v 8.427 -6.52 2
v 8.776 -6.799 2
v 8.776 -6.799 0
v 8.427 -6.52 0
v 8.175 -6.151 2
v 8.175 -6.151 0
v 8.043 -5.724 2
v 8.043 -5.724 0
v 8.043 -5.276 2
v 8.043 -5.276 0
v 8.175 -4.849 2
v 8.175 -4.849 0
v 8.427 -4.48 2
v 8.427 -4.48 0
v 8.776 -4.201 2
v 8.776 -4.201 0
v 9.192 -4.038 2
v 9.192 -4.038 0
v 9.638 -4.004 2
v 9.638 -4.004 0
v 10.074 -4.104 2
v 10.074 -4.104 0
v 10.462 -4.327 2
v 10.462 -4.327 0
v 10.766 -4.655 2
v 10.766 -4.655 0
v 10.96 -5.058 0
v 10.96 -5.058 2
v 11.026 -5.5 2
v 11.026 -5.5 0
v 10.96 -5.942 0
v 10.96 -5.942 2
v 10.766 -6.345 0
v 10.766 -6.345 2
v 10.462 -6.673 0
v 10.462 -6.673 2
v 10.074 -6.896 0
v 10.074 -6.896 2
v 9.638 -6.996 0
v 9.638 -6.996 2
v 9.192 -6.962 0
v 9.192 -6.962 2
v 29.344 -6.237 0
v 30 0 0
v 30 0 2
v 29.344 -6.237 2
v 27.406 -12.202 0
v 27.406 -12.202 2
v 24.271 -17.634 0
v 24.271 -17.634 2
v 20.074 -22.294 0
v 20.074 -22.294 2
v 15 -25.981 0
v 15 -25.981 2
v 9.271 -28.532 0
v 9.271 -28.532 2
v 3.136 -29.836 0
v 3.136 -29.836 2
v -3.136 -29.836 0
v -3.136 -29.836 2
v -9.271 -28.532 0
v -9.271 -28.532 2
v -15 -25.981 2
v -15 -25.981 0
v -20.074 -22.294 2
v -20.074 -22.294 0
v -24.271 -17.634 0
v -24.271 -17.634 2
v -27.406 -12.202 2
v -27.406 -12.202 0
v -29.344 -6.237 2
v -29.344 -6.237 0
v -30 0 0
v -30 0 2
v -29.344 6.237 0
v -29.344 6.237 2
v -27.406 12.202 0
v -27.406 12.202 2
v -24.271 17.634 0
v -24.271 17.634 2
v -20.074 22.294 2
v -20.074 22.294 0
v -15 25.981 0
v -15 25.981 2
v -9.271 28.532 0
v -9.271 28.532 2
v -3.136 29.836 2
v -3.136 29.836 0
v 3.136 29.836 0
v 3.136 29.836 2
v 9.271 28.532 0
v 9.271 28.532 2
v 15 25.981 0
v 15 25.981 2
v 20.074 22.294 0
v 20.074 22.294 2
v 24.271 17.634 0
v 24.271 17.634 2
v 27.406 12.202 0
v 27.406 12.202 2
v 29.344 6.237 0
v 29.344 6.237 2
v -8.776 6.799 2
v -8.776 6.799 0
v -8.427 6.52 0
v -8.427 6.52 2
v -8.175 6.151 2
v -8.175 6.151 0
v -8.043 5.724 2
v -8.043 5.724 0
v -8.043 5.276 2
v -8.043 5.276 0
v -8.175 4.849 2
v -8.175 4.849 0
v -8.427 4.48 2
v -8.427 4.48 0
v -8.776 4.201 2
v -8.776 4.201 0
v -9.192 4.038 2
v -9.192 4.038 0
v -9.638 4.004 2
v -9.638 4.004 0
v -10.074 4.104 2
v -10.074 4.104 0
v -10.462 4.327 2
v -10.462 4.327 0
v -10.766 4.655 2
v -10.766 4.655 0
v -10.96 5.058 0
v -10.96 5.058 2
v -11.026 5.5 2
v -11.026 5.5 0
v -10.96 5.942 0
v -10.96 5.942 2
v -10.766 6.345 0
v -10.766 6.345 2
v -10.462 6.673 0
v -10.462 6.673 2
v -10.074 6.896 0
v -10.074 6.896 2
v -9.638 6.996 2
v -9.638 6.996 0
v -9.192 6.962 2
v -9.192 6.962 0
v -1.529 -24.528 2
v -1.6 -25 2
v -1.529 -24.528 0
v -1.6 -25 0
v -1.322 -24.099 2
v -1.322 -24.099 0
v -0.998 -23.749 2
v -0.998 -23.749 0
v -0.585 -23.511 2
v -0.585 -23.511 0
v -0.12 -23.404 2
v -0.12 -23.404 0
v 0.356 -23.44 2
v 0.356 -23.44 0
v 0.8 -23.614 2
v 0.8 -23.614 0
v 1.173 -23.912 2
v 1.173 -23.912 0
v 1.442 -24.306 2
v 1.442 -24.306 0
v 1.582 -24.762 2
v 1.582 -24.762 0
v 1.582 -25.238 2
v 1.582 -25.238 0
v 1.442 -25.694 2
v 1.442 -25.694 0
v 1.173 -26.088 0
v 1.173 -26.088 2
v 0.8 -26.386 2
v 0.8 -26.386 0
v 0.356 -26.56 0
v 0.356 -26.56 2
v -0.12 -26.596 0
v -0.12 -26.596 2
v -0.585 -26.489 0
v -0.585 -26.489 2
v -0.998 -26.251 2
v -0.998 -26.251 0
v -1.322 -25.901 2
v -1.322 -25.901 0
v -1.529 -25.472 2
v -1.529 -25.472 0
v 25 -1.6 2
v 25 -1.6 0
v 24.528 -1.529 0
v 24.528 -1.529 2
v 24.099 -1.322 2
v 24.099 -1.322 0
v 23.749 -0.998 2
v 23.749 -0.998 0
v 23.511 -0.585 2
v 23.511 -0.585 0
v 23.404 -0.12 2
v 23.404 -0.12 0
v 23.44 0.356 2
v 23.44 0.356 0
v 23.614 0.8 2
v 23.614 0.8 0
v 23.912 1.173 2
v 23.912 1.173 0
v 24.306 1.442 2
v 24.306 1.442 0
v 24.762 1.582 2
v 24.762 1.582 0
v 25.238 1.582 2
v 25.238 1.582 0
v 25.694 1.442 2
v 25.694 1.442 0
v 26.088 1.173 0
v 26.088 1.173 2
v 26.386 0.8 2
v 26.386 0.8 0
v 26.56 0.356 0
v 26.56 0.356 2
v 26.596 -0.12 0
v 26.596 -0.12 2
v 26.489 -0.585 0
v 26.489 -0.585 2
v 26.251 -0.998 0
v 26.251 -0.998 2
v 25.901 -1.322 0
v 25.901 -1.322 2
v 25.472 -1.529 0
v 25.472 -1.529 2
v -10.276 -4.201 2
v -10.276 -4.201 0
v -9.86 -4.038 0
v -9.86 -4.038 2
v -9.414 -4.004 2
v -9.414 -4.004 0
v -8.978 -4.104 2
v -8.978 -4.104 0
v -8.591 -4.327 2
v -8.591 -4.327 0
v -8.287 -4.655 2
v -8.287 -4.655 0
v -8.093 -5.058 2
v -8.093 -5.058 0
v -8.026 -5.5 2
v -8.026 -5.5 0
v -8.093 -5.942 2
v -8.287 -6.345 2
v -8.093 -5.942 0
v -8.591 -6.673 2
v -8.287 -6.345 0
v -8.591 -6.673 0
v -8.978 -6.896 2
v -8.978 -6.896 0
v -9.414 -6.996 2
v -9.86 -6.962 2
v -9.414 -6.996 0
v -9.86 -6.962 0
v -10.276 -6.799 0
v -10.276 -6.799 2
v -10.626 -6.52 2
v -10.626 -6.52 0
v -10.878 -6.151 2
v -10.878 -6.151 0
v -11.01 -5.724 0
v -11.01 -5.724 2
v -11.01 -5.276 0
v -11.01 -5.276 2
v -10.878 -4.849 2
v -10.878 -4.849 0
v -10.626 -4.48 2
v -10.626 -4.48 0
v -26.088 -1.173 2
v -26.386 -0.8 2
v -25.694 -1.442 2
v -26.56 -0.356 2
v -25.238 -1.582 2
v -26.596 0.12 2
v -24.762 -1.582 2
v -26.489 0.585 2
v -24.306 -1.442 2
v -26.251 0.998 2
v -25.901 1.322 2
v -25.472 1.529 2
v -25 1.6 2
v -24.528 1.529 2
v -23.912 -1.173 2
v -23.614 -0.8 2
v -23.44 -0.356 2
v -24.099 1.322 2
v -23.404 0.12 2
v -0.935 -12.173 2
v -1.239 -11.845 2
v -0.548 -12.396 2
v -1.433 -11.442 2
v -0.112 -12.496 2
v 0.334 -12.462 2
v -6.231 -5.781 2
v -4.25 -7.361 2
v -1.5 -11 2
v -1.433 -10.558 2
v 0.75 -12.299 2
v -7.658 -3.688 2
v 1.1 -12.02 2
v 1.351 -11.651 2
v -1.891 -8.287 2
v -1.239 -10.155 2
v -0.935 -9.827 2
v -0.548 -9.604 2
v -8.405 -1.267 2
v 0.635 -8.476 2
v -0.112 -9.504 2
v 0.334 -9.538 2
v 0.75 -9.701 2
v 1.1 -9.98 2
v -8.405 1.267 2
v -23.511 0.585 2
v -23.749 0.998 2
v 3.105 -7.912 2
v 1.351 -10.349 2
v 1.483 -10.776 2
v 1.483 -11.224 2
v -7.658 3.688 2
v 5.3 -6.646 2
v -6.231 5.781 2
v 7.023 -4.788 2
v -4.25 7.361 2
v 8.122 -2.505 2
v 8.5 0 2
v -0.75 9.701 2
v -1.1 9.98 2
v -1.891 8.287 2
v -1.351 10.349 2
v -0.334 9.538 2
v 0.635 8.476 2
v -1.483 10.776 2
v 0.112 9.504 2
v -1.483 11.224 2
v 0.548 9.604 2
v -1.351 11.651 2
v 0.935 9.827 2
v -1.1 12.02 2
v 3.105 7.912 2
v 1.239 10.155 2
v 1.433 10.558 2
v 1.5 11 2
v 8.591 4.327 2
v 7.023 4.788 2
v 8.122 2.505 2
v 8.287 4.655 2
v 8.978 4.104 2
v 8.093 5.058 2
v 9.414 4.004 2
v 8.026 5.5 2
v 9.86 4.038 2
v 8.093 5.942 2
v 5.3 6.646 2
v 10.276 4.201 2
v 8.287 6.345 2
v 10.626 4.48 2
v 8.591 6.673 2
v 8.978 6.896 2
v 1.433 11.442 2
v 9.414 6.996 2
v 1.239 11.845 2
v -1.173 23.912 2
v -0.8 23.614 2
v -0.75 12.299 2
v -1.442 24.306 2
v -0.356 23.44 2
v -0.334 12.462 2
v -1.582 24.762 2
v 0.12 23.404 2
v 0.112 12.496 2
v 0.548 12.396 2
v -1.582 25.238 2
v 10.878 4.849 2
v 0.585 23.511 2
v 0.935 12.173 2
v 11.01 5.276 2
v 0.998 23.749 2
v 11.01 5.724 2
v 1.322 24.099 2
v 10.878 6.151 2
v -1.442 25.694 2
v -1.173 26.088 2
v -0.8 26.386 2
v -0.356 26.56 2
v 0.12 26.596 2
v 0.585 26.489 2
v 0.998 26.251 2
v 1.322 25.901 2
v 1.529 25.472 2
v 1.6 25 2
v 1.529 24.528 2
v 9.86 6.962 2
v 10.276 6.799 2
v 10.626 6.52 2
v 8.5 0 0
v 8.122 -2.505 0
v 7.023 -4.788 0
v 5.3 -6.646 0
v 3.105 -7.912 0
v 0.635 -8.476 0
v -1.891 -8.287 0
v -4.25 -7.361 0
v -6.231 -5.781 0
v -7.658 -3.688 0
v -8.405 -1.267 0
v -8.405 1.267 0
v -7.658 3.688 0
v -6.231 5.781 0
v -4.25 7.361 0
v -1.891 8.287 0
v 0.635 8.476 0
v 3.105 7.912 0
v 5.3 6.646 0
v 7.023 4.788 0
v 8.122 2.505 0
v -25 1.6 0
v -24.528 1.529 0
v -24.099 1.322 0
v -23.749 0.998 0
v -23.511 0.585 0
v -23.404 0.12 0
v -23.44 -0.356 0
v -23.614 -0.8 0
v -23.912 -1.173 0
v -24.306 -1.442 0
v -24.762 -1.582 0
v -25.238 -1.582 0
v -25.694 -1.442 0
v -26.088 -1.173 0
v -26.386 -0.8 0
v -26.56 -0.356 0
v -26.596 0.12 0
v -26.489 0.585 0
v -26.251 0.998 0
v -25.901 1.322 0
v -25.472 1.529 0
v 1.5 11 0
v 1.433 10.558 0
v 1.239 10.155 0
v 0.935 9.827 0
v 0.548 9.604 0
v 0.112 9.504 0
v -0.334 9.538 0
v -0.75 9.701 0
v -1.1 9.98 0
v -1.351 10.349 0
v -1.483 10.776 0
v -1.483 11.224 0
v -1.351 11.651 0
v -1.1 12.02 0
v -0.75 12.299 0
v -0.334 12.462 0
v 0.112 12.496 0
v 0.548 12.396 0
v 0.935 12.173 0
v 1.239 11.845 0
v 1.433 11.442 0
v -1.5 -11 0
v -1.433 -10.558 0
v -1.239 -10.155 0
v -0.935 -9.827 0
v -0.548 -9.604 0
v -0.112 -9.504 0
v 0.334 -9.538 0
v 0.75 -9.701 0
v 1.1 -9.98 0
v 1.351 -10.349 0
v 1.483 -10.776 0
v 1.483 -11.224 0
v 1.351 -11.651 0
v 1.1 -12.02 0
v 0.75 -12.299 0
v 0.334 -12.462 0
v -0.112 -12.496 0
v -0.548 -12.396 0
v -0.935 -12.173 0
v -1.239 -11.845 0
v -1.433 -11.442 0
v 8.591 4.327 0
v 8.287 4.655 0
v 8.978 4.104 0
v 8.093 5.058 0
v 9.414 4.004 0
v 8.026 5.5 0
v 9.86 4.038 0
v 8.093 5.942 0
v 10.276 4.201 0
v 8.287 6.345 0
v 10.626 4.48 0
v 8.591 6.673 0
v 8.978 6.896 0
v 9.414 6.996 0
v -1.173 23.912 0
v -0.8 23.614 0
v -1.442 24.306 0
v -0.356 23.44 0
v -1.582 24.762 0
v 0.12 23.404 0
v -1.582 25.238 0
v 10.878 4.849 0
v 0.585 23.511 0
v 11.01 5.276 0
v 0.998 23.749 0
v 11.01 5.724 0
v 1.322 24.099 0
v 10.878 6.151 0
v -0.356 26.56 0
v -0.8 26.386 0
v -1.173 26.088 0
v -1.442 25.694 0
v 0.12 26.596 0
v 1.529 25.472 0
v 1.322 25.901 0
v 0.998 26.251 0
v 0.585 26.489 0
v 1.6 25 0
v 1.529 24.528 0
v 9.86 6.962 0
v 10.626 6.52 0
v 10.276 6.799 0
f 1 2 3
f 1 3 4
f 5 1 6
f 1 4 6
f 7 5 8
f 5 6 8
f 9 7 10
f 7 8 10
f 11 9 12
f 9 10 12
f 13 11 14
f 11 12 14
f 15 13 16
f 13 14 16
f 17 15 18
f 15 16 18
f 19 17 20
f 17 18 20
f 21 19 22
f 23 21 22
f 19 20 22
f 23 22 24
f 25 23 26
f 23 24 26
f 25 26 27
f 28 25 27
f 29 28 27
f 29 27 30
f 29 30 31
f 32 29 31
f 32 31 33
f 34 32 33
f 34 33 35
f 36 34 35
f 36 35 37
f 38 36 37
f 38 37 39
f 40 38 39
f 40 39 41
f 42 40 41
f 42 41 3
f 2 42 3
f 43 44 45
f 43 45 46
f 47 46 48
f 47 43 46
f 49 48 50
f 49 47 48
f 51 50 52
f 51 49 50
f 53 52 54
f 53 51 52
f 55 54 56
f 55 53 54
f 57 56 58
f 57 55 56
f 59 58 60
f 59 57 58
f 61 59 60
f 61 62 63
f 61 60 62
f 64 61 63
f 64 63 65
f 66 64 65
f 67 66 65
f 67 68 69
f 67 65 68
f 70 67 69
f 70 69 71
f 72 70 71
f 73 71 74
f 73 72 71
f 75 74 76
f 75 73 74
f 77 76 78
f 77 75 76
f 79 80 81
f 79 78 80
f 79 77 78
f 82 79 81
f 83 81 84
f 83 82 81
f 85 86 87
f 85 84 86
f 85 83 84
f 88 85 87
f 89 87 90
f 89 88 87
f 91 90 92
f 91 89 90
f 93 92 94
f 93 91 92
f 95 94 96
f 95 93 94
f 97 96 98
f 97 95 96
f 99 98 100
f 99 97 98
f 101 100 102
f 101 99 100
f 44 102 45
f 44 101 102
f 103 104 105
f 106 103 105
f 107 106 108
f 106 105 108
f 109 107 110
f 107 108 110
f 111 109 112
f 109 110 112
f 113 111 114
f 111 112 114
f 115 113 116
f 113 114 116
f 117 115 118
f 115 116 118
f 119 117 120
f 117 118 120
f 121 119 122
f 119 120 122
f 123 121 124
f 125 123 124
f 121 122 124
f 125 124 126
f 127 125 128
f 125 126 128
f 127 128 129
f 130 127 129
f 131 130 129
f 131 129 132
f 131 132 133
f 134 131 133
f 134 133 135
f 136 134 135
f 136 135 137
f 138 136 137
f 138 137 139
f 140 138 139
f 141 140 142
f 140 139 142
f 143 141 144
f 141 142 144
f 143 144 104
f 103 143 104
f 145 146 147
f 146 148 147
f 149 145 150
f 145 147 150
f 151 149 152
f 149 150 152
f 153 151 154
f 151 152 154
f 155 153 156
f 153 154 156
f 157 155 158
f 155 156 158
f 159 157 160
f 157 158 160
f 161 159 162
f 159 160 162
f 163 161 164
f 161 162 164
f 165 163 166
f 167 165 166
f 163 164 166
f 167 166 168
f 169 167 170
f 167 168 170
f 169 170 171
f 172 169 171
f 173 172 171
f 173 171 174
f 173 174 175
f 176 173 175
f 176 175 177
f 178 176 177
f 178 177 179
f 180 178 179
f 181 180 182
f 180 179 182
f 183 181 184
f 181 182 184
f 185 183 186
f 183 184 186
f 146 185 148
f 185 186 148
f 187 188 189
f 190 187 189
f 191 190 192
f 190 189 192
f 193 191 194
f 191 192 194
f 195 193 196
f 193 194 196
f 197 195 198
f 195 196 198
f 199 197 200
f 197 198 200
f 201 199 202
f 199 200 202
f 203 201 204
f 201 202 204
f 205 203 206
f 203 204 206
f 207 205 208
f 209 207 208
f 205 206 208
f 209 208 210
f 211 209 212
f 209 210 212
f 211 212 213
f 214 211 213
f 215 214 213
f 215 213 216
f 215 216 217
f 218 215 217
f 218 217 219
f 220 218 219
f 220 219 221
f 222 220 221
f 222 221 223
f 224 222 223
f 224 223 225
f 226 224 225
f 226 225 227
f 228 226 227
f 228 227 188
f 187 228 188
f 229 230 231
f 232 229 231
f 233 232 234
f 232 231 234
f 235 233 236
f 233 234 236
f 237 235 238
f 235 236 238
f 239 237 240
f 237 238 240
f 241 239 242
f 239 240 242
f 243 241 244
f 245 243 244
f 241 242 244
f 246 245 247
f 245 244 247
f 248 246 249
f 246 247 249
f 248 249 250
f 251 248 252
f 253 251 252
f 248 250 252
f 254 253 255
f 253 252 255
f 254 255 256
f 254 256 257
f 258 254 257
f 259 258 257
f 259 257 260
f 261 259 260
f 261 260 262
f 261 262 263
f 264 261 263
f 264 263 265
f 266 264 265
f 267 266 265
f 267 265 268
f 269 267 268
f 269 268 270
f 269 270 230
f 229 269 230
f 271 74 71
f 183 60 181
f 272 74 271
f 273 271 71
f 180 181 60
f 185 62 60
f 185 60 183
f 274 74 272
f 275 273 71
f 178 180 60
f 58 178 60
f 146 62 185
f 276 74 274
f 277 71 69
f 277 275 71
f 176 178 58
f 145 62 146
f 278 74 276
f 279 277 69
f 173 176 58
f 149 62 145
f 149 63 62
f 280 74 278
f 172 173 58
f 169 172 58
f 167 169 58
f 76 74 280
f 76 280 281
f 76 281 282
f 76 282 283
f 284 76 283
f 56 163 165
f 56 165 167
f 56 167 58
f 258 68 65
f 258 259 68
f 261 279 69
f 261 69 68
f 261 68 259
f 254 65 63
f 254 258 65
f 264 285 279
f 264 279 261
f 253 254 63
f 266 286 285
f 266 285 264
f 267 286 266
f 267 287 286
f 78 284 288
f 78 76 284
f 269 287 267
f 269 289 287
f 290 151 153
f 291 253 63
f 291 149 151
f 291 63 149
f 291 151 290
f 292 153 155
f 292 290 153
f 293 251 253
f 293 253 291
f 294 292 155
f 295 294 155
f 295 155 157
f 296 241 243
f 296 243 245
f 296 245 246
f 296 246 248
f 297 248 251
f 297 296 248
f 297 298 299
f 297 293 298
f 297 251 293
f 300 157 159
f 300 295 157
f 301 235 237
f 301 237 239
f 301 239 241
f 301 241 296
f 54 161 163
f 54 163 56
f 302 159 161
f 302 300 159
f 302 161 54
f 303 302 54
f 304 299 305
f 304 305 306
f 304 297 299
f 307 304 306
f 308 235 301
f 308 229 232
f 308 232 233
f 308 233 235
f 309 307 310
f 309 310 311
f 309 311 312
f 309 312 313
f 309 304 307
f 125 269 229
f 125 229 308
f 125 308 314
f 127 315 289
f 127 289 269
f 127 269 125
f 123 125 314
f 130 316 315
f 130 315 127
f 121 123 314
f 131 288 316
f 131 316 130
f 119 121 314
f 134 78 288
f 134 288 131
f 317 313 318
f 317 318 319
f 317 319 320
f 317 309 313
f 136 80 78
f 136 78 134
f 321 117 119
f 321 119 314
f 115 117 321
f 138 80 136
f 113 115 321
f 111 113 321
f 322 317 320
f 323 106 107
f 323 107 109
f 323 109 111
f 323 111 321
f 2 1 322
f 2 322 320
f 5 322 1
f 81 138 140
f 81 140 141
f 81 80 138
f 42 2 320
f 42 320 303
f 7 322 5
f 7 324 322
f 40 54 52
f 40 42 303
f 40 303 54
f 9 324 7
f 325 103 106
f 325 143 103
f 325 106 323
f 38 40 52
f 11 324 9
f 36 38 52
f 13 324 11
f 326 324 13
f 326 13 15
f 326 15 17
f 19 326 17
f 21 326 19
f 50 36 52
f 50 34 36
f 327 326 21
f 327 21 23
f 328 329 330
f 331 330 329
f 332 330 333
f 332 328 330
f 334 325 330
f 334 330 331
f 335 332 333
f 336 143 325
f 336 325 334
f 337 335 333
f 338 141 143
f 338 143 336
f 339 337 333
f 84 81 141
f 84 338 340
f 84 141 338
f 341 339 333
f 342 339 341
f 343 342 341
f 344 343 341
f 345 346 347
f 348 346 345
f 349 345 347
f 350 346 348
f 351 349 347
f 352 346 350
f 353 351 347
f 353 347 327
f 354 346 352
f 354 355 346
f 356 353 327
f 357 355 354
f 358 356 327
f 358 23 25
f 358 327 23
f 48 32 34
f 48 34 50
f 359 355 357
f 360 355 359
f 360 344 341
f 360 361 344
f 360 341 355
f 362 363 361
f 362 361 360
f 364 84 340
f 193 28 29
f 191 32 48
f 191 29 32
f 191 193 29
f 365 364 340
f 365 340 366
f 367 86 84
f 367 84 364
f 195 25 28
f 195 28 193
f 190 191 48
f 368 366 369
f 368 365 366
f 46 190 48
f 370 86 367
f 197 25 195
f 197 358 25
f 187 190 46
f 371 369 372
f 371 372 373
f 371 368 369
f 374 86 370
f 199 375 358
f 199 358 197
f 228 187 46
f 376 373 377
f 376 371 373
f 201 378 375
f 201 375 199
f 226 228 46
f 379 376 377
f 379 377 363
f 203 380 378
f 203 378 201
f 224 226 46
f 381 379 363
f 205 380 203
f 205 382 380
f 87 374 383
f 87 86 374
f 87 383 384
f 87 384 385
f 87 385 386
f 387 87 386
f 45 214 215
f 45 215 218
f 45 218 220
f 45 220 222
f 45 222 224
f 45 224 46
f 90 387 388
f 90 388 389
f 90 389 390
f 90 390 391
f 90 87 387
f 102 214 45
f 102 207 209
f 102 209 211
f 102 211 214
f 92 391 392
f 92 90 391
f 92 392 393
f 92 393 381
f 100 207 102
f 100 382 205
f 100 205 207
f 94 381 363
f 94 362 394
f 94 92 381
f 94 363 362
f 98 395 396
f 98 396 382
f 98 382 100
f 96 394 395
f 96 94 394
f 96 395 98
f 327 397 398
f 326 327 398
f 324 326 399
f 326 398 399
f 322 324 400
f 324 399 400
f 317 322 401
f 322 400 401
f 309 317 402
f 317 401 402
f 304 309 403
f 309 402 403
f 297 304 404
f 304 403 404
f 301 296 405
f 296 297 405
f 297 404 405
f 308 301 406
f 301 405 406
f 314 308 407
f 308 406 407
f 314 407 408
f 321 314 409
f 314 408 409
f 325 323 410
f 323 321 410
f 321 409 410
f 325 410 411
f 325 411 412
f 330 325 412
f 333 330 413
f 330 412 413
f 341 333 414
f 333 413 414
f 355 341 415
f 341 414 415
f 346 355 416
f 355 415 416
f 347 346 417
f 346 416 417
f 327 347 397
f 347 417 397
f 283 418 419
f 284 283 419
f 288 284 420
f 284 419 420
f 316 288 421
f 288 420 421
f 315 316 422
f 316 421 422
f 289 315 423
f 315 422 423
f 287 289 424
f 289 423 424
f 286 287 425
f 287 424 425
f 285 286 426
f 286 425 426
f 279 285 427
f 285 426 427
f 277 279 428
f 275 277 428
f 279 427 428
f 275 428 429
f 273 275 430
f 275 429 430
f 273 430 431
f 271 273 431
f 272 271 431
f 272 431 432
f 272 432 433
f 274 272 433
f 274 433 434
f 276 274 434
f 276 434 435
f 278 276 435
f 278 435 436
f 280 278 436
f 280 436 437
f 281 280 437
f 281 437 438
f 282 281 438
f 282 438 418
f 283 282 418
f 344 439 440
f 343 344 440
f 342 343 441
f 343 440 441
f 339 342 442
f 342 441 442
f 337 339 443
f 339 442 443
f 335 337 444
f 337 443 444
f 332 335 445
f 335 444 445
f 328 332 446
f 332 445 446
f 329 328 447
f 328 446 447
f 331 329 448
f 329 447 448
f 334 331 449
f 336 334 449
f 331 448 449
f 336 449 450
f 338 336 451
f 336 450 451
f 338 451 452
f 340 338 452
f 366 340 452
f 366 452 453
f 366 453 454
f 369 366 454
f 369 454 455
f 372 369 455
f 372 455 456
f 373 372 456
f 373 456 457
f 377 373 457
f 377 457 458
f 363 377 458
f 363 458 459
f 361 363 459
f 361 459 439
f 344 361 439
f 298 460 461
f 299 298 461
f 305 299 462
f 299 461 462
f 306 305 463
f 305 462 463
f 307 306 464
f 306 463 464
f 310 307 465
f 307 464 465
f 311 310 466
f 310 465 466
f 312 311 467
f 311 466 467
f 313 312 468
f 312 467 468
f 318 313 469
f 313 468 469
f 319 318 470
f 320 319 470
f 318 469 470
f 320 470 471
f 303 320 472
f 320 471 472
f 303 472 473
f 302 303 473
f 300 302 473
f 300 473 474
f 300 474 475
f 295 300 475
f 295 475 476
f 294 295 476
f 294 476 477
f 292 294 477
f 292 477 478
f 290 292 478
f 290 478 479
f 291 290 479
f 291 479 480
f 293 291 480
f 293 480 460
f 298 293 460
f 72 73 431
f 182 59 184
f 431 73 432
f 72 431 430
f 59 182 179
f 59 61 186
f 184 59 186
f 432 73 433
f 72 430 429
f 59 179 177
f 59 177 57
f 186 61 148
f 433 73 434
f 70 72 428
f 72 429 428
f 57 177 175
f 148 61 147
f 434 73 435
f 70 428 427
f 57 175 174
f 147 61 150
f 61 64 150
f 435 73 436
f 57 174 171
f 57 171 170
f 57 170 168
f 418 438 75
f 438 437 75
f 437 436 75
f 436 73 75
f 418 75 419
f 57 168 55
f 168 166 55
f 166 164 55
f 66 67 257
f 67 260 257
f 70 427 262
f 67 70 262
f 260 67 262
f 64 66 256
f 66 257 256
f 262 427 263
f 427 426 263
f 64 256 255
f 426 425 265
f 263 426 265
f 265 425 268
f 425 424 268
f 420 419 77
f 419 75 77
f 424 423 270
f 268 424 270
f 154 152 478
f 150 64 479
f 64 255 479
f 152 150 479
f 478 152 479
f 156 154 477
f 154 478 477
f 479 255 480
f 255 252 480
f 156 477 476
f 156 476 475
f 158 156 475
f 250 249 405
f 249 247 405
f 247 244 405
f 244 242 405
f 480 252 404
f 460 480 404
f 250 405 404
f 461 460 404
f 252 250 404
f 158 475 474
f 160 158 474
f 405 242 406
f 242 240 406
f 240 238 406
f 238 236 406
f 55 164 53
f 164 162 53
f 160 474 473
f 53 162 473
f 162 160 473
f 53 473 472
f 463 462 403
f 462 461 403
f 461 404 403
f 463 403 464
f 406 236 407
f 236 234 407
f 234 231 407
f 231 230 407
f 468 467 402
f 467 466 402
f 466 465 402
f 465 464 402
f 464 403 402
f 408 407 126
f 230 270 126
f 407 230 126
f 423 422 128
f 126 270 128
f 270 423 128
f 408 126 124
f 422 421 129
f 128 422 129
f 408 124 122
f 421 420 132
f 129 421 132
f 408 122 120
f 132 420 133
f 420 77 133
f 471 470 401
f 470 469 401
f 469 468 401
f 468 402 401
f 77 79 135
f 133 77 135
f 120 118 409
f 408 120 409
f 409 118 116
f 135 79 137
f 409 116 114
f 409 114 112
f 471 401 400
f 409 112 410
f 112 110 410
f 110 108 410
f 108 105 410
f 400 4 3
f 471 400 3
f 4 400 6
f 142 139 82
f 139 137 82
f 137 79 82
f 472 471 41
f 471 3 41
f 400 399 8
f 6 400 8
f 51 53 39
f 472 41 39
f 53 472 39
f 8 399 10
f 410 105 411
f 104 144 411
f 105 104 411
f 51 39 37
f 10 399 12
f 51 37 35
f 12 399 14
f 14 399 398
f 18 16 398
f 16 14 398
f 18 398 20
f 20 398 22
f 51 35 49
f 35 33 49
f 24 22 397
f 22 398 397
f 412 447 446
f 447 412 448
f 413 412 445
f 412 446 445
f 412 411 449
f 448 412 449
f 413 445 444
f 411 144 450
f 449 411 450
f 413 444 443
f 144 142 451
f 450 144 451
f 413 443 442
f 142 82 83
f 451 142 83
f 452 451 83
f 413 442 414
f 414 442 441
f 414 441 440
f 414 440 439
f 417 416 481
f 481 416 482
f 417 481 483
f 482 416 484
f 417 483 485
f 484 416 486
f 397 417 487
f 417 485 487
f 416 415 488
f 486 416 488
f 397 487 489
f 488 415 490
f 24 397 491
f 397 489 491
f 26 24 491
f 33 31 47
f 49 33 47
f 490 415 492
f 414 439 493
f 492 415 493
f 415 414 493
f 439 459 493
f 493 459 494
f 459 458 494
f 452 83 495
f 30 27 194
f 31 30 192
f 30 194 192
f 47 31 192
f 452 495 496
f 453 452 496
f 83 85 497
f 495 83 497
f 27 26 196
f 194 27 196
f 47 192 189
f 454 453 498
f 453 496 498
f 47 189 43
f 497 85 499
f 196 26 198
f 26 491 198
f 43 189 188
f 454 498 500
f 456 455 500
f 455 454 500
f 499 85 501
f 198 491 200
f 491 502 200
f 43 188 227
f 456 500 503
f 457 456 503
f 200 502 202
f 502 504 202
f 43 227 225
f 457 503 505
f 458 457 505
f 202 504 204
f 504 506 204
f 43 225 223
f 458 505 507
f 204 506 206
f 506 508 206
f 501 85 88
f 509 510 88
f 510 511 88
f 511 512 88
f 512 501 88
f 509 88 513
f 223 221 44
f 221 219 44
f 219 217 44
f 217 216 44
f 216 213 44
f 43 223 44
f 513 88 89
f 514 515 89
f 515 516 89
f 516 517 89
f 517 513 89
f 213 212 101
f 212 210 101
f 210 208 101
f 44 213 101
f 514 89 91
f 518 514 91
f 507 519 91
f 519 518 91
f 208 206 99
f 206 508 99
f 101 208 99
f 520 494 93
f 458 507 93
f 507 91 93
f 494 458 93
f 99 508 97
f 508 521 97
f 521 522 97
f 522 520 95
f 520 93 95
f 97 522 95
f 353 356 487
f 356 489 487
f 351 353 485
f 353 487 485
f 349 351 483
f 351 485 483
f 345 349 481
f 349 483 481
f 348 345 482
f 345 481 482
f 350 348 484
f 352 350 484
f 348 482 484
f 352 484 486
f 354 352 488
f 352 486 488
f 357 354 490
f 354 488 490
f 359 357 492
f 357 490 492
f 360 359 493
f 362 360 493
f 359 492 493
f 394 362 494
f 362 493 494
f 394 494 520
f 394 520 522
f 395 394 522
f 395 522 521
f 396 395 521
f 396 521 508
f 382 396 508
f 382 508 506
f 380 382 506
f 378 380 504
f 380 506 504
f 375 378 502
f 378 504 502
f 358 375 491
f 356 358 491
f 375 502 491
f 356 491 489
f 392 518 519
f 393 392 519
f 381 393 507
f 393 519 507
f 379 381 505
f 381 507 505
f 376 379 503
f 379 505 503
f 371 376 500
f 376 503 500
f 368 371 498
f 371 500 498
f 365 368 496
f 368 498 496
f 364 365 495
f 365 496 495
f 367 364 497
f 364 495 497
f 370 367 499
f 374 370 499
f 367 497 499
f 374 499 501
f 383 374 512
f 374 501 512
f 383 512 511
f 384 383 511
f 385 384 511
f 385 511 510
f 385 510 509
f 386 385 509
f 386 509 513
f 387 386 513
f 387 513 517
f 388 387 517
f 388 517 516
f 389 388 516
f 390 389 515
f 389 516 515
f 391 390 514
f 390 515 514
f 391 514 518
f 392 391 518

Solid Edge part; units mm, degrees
sketch "Sketch1" plane through (0, 0, 0) normal (0, 0, 1) x (1, 0, 0)
  circle A0 centre (0, 0) radius 30
  circle A1 centre (0, 0) radius 8.5
extrude "Protrusion1" add sketch "Sketch1" along normal blind 2
sketch "Sketch2" plane through (0, 0, 0) normal (0, 0, 1) x (1, 0, 0)
  circle A0 centre (0, 11) radius 1.5
extrude "ExtrudedCutout_1" cut sketch "Sketch2" along normal mid plane 65.6802
pattern_circular "PatternOccurrence_1" count 6 over 360 about axis through (0, 0, 0) along (0, 0, -1) of "ExtrudedCutout_1"
sketch "Sketch3" plane through (0, 0, 0) normal (0, 0, 1) x (1, 0, 0)
  circle A0 centre (0, 25) radius 1.6
extrude "ExtrudedCutout_2" cut sketch "Sketch3" along normal mid plane 456.4322
pattern_circular "PatternOccurrence_2" count 4 over 360 about axis through (0, 0, 0) along (0, 0, -1) of "ExtrudedCutout_2"
